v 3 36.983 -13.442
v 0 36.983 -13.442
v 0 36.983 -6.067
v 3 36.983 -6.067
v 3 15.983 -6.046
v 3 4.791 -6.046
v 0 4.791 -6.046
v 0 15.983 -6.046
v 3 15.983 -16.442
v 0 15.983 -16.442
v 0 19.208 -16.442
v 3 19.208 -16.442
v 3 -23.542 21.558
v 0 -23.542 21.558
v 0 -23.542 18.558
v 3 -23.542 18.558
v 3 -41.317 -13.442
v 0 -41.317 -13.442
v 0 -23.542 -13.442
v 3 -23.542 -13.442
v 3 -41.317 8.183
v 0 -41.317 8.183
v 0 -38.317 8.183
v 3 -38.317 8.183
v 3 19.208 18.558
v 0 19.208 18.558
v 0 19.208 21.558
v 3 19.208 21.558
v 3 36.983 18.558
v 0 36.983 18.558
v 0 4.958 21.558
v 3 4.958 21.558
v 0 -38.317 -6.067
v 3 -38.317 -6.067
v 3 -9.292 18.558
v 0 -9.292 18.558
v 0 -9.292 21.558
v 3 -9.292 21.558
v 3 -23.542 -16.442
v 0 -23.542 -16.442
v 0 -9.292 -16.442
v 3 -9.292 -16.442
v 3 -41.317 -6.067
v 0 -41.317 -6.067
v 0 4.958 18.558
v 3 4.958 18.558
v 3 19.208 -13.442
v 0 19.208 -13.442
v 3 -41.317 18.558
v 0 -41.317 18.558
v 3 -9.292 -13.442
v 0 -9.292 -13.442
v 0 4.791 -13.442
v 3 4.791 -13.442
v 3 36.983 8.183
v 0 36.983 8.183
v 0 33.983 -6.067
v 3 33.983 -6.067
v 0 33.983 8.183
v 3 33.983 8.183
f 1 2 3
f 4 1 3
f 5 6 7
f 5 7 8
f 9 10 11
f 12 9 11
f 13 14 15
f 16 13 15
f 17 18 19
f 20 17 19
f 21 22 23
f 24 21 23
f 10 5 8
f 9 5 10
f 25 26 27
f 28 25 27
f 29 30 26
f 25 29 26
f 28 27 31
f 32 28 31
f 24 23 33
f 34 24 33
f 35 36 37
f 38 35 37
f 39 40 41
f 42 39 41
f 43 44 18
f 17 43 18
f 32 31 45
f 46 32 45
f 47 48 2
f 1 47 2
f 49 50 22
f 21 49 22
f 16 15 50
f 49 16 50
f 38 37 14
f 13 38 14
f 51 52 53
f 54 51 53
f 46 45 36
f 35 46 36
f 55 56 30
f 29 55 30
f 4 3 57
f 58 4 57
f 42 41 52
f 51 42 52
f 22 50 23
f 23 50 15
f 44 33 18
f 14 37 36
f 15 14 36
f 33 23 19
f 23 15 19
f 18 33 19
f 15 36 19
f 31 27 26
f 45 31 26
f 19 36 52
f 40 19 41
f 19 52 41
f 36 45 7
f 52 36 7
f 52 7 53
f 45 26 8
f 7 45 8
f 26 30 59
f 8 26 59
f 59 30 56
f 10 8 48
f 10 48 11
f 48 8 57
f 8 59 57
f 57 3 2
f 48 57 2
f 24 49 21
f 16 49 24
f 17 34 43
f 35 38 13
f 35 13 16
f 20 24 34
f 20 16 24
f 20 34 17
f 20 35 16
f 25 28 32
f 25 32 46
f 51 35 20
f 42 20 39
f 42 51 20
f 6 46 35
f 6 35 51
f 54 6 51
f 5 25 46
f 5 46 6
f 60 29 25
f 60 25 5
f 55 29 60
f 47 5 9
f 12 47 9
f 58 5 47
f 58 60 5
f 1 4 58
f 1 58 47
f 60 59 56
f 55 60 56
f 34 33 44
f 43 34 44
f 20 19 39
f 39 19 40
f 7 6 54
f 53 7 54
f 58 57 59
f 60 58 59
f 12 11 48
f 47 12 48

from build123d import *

# Parameters (mm, degrees)
BOSS_EXTRUDE1_DEPTH = 3
SKETCH2_W           = 11
SKETCH2_H           = 11.192112216
CUT_EXTRUDE1_DEPTH  = 10


with BuildPart() as part:
    # Sketch1 → Boss-Extrude1 (new body)
    with BuildSketch(Plane(origin=(0, 0, 0), x_dir=(0, 0, -1), z_dir=(1, 0, 0))):
        Polygon((-18.557859796, 36.983092069), (-18.557859796, 19.208092069), (-21.557859796, 19.208092069), (-21.557859796, 4.958092069), (-18.557859796, 4.958092069), (-18.557859796, -9.291907931), (-21.557859796, -9.291907931), (-21.557859796, -23.541907931), (-18.557859796, -23.541907931), (-18.557859796, -37.791907931), (-18.557859796, -41.316907931), (-8.182859796, -41.316907931), (-8.182859796, -38.316907931), (6.067140204, -38.316907931), (6.067140204, -41.316907931), (13.442140204, -41.316907931), (13.442140204, -23.541907931), (16.442140204, -23.541907931), (16.442140204, -9.291907931), (13.442140204, -9.291907931), (13.442140204, 4.958092069), (16.442140204, 4.958092069), (16.442140204, 19.208092069), (13.442140204, 19.208092069), (13.442140204, 33.458092069), (13.442140204, 36.983092069), (6.067140204, 36.983092069), (6.067140204, 33.983092069), (-8.182859796, 33.983092069), (-8.182859796, 36.983092069), align=None)
    extrude(amount=BOSS_EXTRUDE1_DEPTH)

    # Sketch2 → Cut-Extrude1 (cut)
    with BuildSketch(Plane(origin=(3, 0, 0), x_dir=(0, 0, -1), z_dir=(1, 0, 0))):
        with Locations((11.545501323, 10.387035961)):
            Rectangle(SKETCH2_W, SKETCH2_H)
    extrude(amount=-CUT_EXTRUDE1_DEPTH, mode=Mode.SUBTRACT)


solid = part.part
